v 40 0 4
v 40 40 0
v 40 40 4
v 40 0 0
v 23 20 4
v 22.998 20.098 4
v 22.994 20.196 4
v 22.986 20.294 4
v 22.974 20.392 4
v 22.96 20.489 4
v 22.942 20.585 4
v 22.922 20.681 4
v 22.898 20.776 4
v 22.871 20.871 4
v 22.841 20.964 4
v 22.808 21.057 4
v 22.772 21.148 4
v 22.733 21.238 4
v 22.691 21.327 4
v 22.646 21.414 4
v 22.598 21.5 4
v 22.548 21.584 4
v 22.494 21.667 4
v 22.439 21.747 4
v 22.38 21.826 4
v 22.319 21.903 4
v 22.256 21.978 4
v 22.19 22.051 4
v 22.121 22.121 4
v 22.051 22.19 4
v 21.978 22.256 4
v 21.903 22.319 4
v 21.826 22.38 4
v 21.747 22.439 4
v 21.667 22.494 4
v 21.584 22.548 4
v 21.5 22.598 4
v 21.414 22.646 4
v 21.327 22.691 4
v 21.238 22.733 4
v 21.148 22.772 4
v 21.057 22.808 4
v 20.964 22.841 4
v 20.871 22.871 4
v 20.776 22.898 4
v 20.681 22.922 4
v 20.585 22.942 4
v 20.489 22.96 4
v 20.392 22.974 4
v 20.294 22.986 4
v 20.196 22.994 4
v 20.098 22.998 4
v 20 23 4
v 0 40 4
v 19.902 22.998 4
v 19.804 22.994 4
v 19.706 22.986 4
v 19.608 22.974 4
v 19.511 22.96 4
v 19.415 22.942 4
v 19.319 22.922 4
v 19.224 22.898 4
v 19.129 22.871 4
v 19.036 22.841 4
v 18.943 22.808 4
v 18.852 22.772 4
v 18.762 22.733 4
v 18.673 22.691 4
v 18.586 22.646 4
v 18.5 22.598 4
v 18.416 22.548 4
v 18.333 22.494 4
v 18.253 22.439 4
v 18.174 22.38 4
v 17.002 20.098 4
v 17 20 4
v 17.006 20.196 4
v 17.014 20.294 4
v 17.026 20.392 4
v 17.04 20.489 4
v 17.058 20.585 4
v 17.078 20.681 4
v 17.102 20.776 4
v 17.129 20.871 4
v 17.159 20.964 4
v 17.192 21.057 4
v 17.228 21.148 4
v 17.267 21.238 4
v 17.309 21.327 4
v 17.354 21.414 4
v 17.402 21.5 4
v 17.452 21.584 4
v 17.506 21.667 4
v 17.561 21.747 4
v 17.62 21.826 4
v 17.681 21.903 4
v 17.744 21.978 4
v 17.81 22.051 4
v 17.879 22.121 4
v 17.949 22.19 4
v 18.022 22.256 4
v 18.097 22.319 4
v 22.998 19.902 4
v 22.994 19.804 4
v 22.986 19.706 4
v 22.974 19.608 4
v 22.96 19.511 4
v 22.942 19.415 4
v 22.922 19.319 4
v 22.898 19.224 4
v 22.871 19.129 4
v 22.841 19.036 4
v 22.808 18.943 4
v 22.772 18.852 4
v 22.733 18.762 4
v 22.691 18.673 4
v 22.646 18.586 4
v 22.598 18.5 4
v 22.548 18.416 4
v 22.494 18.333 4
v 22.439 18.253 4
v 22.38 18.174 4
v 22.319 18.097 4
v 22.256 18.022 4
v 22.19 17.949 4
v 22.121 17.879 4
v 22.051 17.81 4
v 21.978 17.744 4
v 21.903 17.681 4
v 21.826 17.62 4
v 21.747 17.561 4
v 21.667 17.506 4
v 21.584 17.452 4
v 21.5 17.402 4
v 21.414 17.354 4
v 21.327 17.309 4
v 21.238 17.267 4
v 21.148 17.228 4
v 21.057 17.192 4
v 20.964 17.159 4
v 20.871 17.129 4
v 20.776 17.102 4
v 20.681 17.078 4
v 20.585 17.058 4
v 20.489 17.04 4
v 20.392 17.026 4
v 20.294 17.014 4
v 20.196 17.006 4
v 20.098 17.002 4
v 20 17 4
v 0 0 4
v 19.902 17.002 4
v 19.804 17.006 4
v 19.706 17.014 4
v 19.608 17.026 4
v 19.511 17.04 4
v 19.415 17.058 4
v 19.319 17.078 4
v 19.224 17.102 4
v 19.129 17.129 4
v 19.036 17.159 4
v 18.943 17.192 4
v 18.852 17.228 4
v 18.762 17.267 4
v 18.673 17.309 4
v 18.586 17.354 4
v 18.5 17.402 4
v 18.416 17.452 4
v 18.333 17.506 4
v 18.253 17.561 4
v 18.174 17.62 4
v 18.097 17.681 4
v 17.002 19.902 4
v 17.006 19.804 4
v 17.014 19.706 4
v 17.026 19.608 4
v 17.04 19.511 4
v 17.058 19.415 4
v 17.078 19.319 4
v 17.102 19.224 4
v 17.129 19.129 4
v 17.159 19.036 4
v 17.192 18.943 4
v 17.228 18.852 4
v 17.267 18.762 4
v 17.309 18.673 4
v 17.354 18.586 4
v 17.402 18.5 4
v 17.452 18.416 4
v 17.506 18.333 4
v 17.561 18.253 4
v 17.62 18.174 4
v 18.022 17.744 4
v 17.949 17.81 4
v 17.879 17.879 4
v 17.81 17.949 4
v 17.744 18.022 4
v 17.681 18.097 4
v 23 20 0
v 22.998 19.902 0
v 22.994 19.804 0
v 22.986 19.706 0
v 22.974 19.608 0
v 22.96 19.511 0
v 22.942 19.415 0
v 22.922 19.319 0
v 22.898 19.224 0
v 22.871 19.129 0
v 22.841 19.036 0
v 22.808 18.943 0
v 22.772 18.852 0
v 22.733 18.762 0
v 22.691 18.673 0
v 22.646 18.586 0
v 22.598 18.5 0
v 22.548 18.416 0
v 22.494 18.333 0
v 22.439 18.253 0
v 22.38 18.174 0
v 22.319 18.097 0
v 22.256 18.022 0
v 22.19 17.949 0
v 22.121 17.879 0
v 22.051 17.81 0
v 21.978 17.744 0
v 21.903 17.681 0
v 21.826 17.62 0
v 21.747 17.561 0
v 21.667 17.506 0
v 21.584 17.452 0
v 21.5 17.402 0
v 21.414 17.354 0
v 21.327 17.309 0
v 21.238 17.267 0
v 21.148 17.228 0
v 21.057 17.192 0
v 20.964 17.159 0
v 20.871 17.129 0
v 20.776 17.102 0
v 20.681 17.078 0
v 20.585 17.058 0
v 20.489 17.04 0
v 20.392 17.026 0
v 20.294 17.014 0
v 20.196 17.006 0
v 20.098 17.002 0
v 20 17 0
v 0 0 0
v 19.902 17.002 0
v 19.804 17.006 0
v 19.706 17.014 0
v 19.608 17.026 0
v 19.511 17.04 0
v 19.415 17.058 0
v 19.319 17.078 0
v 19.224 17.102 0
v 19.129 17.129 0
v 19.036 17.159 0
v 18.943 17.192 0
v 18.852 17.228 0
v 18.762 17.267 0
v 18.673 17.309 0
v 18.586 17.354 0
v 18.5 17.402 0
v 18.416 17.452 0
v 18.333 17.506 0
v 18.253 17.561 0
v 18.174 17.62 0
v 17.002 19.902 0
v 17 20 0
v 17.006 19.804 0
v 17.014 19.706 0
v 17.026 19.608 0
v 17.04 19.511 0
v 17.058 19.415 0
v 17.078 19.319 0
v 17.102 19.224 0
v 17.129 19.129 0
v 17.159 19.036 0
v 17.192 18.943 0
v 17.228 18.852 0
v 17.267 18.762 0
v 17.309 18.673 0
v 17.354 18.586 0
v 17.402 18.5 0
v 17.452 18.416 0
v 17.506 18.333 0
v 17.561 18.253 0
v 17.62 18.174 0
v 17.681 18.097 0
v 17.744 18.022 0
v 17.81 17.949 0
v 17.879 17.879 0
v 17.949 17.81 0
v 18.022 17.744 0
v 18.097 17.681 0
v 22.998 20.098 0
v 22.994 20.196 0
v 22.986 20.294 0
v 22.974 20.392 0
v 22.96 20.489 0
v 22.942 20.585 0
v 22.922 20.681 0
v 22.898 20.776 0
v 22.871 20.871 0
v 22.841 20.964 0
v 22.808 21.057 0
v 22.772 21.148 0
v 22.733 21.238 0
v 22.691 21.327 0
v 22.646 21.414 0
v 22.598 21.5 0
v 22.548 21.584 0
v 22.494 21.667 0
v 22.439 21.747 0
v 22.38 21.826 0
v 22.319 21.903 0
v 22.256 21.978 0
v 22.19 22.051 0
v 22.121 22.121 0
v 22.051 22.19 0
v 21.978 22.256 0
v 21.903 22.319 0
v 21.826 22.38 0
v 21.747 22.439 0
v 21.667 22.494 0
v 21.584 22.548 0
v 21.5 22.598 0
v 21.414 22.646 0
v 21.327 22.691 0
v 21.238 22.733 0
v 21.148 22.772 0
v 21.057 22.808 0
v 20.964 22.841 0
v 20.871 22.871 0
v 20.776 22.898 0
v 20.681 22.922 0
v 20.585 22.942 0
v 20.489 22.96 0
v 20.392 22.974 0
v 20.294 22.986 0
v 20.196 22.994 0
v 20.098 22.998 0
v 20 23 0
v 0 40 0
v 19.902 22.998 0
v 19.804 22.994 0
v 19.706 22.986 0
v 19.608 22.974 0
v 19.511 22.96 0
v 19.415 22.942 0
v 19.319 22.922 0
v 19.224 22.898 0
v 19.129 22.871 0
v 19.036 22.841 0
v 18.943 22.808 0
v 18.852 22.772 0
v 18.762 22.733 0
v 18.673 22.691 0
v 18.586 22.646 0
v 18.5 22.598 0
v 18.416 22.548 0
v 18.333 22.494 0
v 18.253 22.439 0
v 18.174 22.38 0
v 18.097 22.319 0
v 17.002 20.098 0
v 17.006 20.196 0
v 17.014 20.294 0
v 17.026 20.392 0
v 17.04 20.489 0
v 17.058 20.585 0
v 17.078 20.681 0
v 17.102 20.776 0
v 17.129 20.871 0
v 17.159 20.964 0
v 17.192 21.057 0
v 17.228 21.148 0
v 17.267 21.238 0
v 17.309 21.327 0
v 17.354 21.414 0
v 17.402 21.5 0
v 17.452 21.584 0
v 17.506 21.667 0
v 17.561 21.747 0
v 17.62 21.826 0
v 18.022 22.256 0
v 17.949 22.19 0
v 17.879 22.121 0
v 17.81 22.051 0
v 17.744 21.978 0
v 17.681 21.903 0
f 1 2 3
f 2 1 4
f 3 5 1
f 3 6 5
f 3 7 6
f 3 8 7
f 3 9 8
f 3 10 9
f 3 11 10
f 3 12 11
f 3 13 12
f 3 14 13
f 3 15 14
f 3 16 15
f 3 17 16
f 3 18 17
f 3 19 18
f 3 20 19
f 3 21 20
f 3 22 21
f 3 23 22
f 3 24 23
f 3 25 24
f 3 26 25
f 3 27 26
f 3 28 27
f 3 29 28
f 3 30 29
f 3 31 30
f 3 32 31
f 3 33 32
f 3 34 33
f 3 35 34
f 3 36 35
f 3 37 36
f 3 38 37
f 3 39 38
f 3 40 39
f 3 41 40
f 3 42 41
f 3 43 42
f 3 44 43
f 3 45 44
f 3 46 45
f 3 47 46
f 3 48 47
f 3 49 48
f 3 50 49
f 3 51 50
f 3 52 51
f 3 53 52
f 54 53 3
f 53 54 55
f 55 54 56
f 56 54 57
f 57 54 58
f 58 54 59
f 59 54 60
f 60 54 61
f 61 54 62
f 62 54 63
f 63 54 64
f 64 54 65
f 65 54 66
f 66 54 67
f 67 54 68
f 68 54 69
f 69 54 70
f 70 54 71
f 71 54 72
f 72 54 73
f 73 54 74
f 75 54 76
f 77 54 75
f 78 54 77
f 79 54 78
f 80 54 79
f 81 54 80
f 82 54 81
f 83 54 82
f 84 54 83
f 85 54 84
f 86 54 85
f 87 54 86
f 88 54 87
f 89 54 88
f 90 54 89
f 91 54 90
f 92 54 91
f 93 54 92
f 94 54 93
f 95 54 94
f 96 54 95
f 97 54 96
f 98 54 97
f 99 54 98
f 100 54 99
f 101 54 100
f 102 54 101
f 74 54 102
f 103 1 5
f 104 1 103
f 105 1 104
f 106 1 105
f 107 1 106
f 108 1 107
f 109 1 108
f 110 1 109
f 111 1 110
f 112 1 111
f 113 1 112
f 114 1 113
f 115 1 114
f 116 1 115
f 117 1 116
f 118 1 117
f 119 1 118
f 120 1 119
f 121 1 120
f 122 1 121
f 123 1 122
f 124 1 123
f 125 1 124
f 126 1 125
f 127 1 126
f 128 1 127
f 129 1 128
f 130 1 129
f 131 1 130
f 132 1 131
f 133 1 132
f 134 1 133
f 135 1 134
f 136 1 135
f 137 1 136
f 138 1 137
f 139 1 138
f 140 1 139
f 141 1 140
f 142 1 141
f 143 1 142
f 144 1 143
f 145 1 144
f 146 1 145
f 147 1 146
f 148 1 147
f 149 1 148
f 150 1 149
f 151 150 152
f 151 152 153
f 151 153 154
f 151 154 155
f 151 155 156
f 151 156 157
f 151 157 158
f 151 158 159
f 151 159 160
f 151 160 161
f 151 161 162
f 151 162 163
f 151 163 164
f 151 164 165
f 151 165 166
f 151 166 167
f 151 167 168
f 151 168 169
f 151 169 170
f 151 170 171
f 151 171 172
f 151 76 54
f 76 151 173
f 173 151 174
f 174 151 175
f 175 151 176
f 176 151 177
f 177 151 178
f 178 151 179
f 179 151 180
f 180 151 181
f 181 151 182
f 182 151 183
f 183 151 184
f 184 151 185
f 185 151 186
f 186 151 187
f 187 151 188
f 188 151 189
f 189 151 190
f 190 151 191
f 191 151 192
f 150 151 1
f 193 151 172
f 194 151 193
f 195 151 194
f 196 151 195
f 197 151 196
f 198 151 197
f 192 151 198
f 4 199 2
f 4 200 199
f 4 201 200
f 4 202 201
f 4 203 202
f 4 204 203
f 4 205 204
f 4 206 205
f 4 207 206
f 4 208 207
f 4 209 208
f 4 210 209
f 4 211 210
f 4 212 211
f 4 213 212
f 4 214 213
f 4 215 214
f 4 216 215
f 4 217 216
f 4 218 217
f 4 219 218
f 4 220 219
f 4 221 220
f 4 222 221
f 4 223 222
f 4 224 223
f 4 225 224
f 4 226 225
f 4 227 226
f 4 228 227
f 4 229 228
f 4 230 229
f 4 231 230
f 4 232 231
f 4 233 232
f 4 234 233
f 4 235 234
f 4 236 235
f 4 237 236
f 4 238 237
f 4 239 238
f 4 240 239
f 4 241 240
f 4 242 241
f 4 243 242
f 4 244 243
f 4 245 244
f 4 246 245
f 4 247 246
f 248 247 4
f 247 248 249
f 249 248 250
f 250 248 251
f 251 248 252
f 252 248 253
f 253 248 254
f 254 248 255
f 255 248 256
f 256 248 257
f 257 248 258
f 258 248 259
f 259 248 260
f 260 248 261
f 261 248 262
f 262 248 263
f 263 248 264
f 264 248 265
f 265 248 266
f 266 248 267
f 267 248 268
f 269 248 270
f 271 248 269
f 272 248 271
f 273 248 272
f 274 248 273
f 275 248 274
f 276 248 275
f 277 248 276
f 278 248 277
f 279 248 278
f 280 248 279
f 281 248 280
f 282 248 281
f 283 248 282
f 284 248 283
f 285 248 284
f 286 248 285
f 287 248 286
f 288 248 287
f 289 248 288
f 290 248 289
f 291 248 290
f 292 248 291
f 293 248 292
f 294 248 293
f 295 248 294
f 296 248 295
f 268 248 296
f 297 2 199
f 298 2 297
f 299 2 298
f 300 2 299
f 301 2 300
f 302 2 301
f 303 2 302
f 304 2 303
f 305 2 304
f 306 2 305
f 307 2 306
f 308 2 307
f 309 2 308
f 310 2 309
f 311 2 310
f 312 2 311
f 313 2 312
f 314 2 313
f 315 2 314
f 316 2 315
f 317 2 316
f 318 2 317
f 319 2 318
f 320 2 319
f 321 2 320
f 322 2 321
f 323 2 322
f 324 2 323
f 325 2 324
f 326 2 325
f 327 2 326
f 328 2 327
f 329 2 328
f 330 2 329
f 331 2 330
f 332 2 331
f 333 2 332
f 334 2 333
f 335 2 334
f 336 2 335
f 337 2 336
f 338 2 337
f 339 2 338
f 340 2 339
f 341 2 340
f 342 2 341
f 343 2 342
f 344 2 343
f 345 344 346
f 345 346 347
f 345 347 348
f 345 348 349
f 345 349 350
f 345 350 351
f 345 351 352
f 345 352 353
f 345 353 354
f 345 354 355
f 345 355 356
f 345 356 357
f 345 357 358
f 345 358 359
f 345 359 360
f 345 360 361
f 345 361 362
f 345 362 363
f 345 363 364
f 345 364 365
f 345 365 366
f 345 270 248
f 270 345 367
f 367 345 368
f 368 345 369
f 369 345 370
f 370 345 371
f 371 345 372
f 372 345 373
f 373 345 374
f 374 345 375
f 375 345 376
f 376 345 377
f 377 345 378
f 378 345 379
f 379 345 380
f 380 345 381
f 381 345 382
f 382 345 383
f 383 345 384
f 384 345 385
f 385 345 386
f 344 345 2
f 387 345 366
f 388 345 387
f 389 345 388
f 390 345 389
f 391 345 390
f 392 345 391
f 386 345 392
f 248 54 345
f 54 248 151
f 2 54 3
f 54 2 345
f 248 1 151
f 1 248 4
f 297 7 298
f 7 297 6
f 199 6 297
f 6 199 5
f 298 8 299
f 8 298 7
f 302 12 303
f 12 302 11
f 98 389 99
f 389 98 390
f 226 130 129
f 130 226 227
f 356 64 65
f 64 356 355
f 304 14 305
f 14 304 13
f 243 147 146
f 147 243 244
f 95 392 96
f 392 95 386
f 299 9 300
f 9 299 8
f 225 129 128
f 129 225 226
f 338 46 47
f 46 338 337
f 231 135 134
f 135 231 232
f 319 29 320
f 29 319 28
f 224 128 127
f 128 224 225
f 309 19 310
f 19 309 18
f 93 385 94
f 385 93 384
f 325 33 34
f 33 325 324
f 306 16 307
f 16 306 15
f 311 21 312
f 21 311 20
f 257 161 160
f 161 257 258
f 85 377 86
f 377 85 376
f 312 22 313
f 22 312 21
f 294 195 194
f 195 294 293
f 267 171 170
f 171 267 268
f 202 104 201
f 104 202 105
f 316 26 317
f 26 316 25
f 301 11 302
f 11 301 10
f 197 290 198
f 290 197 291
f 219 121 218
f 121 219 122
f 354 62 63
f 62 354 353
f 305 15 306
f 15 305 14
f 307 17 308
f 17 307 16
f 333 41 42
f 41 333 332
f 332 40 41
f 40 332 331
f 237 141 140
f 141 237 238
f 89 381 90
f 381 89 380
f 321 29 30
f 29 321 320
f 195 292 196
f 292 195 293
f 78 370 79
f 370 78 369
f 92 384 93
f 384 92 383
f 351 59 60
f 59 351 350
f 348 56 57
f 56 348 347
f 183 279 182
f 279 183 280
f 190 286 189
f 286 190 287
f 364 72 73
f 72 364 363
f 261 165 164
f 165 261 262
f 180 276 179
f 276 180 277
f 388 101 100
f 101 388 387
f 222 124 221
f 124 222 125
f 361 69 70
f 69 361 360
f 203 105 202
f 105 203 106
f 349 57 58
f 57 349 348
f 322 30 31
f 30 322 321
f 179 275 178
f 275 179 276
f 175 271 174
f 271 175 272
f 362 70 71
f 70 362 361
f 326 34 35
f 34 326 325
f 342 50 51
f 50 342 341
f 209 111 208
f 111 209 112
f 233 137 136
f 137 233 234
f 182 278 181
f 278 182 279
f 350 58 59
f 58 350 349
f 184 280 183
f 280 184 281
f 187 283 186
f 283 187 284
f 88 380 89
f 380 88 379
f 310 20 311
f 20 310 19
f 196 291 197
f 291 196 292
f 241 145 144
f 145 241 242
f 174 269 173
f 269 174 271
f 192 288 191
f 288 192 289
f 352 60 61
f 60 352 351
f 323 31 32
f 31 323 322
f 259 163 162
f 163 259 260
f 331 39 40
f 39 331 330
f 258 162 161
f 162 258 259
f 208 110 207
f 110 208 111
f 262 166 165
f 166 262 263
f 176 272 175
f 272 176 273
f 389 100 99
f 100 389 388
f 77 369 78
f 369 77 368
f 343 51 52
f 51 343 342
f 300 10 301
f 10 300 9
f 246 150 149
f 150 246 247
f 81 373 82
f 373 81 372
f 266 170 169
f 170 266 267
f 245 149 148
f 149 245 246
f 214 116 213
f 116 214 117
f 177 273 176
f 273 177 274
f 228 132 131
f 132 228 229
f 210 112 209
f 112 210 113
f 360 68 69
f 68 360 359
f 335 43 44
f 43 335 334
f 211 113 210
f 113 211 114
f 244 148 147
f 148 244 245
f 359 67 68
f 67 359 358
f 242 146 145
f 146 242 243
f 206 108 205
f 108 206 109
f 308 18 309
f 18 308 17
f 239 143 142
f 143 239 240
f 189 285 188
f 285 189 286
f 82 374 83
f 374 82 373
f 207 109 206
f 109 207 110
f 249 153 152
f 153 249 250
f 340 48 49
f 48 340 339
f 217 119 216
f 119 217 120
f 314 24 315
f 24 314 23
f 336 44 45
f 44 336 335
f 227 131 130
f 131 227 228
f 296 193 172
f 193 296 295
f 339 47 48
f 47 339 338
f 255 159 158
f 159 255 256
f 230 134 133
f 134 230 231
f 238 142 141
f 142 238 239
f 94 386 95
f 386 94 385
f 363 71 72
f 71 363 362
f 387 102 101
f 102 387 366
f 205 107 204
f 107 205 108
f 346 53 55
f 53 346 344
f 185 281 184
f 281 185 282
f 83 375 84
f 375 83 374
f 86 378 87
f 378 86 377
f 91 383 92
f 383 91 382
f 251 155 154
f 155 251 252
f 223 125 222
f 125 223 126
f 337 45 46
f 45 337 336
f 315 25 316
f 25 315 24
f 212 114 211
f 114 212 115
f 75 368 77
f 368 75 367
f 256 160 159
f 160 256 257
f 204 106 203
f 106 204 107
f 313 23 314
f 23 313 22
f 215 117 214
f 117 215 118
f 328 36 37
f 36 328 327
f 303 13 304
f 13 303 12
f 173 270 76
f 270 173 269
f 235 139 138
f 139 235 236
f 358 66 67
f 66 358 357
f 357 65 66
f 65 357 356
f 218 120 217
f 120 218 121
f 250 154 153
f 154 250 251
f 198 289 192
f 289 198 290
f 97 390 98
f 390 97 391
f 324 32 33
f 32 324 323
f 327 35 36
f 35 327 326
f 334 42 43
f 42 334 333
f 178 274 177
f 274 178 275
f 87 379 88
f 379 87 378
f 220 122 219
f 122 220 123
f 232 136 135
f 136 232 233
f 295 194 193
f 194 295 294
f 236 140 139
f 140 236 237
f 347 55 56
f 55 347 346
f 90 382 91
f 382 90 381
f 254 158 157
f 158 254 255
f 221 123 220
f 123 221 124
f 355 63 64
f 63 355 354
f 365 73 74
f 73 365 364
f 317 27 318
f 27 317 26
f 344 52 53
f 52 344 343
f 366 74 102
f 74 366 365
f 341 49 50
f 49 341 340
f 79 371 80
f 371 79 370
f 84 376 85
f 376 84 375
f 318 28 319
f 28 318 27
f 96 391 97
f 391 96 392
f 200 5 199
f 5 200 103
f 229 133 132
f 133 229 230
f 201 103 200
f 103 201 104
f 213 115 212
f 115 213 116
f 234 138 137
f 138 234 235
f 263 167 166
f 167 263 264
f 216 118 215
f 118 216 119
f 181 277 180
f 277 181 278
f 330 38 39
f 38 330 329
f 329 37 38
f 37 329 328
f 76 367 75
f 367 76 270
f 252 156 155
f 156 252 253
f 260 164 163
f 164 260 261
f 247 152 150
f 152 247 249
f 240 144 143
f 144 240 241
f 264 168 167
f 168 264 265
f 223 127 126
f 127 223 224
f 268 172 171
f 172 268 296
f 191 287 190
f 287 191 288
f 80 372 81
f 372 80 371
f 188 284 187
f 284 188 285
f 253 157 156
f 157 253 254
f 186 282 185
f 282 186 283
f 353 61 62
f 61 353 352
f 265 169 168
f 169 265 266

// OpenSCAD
// Piastrina 40 x 40 x 4 mm con foro passante centrale da 6 mm
lato = 40;
altezza = 4;
diametro_foro = 6;   // metti 6.2 se il foro deve accogliere un perno da 6 mm

difference() {
    cube([lato, lato, altezza]);
    translate([lato/2, lato/2, -1])
        cylinder(d = diametro_foro, h = altezza + 2, $fn = 192);
}
